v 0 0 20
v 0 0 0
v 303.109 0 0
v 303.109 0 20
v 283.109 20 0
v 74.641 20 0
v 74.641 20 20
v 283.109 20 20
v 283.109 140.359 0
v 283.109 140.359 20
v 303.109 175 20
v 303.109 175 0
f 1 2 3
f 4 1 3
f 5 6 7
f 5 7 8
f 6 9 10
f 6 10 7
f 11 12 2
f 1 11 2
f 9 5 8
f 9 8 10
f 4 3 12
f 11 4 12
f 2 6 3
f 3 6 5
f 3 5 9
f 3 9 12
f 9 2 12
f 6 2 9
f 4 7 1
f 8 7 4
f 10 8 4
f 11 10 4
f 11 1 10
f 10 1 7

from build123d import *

# Parameters (mm, degrees)
BOSS_EXTRUDE1_DEPTH = 20


with BuildPart() as part:
    # Sketch1 → Boss-Extrude1 (new body)
    with BuildSketch(Plane.XY):
        Polygon((0, 0), (303.108891325, 0), (303.108891325, 175), align=None)
        Polygon((283.108891325, 140.358983849), (74.641016151, 20), (283.108891325, 20), align=None, mode=Mode.SUBTRACT)
    extrude(amount=BOSS_EXTRUDE1_DEPTH)


solid = part.part
